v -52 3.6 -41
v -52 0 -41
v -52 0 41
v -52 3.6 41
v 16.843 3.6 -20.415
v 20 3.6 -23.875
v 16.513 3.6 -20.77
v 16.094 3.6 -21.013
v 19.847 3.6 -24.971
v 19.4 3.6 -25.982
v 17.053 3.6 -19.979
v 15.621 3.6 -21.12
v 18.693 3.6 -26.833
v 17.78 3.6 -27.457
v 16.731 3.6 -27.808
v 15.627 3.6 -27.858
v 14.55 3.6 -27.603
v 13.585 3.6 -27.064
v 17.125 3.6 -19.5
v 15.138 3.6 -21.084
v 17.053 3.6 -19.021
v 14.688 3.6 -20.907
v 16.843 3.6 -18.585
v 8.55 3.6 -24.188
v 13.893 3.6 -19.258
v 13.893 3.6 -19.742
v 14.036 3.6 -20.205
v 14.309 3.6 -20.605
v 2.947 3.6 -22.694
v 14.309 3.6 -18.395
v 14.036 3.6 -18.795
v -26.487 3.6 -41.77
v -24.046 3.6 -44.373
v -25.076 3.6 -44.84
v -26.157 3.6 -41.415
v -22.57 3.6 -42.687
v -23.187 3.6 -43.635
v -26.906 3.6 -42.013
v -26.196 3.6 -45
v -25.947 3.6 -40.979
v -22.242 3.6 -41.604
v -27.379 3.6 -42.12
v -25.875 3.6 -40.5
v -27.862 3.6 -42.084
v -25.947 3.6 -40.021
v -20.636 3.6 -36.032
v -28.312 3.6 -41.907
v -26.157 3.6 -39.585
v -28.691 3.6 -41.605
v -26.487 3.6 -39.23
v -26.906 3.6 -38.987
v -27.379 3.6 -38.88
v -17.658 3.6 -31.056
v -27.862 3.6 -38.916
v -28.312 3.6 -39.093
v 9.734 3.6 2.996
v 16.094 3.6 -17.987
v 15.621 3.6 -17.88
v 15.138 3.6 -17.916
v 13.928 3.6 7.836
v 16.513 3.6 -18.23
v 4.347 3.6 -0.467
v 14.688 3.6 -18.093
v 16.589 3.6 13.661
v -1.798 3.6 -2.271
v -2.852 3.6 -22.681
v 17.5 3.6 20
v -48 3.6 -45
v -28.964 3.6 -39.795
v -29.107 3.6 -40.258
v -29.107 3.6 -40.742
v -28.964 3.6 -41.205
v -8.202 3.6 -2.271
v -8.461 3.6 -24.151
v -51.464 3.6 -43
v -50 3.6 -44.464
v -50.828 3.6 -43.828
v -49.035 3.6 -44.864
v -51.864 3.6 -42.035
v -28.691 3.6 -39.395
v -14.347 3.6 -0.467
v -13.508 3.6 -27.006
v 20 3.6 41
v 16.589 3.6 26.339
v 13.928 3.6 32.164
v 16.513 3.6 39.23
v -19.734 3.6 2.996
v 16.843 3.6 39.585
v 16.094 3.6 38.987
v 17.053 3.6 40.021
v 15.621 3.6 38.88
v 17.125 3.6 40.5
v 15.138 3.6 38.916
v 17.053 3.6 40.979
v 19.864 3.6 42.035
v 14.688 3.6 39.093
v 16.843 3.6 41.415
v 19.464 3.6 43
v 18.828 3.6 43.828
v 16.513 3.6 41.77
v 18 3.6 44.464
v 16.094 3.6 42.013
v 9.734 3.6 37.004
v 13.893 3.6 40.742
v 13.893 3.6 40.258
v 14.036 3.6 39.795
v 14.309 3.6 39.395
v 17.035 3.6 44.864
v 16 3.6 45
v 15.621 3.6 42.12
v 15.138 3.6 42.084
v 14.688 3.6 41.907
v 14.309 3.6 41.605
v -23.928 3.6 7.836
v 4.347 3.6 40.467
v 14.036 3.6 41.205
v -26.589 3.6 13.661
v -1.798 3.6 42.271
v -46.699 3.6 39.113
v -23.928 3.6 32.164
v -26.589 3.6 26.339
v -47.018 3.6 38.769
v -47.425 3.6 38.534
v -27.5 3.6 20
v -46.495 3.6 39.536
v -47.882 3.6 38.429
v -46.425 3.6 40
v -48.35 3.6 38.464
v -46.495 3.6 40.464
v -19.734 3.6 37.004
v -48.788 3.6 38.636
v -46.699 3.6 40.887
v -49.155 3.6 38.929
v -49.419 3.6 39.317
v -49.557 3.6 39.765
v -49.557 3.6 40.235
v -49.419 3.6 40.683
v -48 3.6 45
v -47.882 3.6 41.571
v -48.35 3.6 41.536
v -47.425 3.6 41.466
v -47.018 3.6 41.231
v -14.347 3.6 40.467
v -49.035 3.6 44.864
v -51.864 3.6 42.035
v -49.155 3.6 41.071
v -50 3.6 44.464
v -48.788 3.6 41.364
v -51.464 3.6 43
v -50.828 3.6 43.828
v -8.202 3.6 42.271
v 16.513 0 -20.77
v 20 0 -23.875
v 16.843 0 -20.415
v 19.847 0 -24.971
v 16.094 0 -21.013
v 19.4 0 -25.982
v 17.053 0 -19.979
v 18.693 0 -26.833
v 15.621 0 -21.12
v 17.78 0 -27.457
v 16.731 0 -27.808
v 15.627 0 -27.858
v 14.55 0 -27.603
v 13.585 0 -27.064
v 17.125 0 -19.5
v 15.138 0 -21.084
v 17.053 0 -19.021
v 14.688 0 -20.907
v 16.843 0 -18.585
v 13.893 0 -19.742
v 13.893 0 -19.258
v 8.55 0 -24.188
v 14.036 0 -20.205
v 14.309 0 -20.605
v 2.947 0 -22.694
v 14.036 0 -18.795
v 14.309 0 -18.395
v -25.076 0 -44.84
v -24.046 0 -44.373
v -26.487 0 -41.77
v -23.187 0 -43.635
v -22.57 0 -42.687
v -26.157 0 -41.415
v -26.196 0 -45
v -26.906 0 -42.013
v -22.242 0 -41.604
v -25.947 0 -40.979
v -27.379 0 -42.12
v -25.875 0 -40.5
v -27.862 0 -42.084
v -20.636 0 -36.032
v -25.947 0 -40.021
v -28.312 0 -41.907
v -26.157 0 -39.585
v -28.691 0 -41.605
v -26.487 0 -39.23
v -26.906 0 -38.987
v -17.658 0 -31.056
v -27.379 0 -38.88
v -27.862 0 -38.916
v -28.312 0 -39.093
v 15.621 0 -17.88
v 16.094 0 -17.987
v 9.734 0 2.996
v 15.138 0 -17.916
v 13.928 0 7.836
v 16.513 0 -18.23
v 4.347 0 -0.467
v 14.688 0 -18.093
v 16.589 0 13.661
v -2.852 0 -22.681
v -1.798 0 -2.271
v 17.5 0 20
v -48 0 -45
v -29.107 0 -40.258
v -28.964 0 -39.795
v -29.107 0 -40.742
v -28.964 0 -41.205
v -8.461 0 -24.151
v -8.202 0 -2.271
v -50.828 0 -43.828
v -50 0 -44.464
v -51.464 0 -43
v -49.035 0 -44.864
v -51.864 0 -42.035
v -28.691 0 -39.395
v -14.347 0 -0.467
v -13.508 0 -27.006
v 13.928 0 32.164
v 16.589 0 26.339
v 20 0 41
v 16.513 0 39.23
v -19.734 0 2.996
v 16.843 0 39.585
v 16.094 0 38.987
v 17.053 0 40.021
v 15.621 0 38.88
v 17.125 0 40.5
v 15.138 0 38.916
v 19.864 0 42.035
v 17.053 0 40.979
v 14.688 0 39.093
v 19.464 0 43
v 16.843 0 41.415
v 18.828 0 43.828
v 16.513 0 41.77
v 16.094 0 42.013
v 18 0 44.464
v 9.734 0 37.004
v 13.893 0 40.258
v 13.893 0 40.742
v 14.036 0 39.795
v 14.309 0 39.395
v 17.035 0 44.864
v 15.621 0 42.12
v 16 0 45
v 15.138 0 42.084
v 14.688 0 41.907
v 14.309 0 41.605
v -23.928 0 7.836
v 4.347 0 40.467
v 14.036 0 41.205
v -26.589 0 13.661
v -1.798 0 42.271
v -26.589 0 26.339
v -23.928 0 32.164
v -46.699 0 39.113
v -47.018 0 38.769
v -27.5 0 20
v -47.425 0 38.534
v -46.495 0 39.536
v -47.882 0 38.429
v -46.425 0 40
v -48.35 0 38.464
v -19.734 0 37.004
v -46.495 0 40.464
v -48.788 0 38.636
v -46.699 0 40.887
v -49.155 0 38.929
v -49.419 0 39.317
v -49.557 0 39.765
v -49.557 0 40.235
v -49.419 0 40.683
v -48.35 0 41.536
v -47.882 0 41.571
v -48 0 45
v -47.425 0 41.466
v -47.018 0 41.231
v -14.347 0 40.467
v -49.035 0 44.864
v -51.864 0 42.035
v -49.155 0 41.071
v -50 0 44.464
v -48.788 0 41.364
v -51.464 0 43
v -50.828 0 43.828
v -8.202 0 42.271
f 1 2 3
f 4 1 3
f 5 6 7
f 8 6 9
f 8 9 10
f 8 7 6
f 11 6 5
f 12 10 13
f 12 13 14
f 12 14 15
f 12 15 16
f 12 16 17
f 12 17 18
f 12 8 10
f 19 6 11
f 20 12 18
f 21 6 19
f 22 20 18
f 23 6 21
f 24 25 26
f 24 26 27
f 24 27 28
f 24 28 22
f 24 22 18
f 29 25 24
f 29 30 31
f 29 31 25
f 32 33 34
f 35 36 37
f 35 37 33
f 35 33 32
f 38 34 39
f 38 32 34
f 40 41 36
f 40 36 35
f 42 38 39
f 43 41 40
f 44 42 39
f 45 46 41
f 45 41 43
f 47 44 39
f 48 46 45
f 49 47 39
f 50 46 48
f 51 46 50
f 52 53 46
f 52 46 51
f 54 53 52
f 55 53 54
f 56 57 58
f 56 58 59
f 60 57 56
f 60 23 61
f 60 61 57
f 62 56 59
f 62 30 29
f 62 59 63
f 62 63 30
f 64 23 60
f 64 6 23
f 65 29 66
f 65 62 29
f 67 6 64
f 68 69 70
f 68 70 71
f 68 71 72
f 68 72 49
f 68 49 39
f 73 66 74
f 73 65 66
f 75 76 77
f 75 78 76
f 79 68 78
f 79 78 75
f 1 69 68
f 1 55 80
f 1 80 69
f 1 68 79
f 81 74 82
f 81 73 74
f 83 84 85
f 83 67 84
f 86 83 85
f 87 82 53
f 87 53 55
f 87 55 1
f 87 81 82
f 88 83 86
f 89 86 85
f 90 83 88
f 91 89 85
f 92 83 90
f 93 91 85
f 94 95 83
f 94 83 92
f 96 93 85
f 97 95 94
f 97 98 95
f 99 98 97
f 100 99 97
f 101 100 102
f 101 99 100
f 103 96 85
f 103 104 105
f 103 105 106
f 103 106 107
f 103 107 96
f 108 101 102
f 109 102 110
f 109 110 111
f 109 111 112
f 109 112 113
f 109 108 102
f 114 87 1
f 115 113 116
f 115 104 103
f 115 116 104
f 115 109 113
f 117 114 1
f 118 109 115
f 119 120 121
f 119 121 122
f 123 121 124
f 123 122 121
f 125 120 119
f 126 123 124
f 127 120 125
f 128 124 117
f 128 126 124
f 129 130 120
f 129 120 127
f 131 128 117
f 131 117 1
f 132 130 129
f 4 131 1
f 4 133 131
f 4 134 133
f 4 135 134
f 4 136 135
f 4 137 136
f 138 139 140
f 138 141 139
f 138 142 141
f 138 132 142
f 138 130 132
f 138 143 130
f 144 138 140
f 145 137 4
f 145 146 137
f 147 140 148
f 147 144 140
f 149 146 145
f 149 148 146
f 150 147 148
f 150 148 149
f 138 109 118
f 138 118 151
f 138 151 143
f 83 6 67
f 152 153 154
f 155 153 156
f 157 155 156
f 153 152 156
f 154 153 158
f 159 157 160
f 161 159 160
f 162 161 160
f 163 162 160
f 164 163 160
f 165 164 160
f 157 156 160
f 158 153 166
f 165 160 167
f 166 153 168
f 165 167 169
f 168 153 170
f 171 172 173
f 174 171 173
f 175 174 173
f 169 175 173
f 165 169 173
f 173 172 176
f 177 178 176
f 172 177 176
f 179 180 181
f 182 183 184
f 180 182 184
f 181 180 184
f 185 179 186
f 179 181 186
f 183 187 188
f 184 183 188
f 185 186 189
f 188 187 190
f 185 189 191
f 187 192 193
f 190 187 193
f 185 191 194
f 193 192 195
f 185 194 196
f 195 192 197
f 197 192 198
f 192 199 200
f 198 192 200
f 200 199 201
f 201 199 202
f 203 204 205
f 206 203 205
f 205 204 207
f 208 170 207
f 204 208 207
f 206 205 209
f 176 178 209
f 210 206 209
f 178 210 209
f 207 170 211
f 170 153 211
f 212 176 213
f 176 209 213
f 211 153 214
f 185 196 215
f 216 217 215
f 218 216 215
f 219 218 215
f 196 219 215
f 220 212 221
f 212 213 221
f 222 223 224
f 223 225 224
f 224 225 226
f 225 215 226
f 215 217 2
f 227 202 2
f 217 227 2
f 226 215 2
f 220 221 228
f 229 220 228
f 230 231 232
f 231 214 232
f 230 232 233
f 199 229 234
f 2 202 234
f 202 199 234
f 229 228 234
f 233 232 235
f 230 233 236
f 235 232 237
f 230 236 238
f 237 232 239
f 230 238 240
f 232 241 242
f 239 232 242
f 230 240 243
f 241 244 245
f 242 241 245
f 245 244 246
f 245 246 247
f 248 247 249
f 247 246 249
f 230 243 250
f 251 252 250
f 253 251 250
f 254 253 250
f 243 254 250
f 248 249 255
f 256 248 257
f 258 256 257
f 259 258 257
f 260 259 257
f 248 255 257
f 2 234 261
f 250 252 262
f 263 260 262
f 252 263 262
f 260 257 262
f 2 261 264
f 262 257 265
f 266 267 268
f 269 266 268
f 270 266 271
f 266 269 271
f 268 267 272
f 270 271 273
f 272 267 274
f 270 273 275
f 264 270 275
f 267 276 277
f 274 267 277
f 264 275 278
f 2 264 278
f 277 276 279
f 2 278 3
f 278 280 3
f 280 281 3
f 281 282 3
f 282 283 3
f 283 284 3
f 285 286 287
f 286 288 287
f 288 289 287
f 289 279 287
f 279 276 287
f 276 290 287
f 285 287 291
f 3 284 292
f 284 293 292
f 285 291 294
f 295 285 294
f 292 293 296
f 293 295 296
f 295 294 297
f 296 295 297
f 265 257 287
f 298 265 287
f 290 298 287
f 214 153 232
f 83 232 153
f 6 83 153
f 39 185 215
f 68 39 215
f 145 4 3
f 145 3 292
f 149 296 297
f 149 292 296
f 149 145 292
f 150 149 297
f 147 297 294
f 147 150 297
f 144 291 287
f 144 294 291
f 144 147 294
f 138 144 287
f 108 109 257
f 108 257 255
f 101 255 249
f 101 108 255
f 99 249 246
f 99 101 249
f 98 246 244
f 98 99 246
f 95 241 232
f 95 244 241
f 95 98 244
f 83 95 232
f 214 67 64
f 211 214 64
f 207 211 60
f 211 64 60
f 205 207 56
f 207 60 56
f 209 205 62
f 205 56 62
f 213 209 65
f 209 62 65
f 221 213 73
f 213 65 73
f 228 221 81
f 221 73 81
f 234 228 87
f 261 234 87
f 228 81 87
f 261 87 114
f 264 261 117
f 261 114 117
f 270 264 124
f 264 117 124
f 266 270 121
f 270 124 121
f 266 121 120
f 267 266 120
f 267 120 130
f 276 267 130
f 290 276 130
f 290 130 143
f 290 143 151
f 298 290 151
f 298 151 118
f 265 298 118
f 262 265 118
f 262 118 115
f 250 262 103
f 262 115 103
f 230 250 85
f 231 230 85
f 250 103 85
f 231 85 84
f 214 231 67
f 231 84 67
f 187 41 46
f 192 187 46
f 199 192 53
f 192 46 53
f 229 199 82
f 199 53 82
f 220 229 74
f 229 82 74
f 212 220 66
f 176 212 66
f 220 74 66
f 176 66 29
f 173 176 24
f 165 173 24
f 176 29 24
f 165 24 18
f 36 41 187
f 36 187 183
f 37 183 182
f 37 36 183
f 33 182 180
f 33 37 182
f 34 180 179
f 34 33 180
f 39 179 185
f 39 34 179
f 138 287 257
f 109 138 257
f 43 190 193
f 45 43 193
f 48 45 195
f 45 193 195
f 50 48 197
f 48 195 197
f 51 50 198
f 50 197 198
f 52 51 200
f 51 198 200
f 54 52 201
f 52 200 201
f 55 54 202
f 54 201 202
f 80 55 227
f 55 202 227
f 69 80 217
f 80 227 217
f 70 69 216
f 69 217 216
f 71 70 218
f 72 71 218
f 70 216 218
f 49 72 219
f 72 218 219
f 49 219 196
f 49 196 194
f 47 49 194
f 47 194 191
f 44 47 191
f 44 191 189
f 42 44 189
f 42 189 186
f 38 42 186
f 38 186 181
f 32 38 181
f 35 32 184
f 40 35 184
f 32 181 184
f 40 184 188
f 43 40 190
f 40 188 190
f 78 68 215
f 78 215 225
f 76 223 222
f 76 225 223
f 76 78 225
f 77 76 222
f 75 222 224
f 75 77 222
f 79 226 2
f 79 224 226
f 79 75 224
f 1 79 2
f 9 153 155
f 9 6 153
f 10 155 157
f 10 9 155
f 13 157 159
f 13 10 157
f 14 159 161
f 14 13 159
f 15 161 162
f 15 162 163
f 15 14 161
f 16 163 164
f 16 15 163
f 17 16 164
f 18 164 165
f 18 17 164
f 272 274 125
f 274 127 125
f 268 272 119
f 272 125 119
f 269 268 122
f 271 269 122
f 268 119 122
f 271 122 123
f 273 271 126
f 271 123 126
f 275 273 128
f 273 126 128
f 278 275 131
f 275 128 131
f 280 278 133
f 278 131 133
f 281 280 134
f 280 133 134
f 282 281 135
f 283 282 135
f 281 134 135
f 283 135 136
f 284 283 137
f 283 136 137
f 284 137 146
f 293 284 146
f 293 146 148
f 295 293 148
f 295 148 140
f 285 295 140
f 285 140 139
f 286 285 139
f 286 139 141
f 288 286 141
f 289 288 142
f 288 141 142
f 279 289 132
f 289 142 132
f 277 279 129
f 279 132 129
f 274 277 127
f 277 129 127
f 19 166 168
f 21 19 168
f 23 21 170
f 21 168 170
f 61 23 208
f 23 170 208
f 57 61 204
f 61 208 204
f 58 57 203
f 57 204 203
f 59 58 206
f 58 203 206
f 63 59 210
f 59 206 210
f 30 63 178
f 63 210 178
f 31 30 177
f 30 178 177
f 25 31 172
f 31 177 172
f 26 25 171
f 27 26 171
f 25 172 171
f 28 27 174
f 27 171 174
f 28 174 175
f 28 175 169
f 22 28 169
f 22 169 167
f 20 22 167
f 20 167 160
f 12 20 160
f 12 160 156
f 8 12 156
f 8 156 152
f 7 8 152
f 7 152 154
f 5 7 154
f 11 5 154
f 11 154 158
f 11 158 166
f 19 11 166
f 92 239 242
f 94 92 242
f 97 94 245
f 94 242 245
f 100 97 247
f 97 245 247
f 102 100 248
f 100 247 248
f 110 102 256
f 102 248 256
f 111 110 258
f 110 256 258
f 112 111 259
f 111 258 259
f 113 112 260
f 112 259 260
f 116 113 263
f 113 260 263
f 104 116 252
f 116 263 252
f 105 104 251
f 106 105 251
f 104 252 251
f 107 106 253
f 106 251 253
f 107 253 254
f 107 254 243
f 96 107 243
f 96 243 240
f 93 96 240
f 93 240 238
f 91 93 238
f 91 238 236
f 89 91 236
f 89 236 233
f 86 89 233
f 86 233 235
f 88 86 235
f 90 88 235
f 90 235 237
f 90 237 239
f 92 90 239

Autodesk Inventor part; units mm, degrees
ref_plane "YZ Plane" through (0, 0, 0) normal (1, 0, 0) x (0, 1, 0)
ref_plane "XZ Plane" through (0, 0, 0) normal (0, 1, 0) x (-1, 0, 0)
ref_plane "XY Plane" through (0, 0, 0) normal (0, 0, 1) x (1, 0, 0)
sketch "Sketch1" plane through (0, 0, 0) normal (0, 1, 0) x (-1, 0, 0)
  line L0 (20, 45) -> (-20, 45)
  line L1 (-20, 45) -> (-20, -45)
  line L2 (-20, -45) -> (20, -45)
  line L3 (20, -45) -> (20, 45)
  line L4 (20, 45) -> (-20, -45) construction
  line L5 (-20, 45) -> (20, -45) construction
  arc A0 (-20, -45) -> (20, -45) centre (0, -45) ccw
  line L6 (20, -45) -> (52, -45)
  line L7 (52, -45) -> (52, 45)
  line L8 (52, 45) -> (20, 45)
  line L9 (20, 45) -> (20, -45)
  point P0 (0, 0)
  dimension "d0" = 40
  dimension "d1" = 90
  dimension "d7" = 32
  dimension "d8" = 90
extrude "Extrusion1" add sketch "Sketch1" along normal blind 3.6
sketch "Sketch3" plane through (0, 3.6, 0) normal (0, 1, 0) x (1, 0, 0)
  arc A0 (20, 45) -> (-20, 45) centre (0, 45) ccw projected
  circle A1 centre (0, 45) radius 20
  circle A2 centre (0, 45) radius 22.5
  point P0 (0, 0)
  point P1 (-19.7203, 38.3333)
  dimension "d13" = 45
extrude "Extrusion3" cut sketch "Sketch3" against normal blind 10 contours A1 A0 | A2
fillet "Fillet2" radius 4 5 edges at (-52, 1.8, -45) (-52, 1.8, 45) (20, 1.8, 45) (-22.5, 1.8, -45) (20, 1.8, -34.6922)
sketch "Sketch4" plane through (0, 3.6, 0) normal (0, 1, 0) x (1, 0, 0)
  circle A0 centre (-5, -20) radius 22.5
  line L0 (20, -41) -> (20, 23.8754) projected
  line L1 (-48, -45) -> (16, -45) projected
  point P0 (0, 0)
  dimension "d14" = 45
  dimension "d15" = 25
  dimension "d16" = 25
extrude "Extrusion4" cut sketch "Sketch4" against normal blind 10
sketch "Sketch5" plane through (0, 0, 0) normal (0, -1, 0) x (1, 0, 0)
  circle A0 centre (-27.5, -40.5) radius 1.625
  circle A1 centre (15.5, 40.5) radius 1.625
  circle A2 centre (15.5, -19.5) radius 1.625
  line L0 (20, 41) -> (20, -23.8754) projected
  line L1 (-48, 45) -> (16, 45) projected
  line L2 (-26.1964, -45) -> (-48, -45) projected
  line L3 (-52, -41) -> (-52, 41) projected
  point P0 (0, 0)
  dimension "d19" = 3.25
  dimension "d21" = 3.25
  dimension "d22" = 3.25
  dimension "d23" = 4.5
  dimension "d24" = 4.5
  dimension "d25" = 4.5
  dimension "d26" = 56.75
  dimension "d27" = 4.5
  dimension "d28" = 24.5
extrude "Extrusion5" cut sketch "Sketch5" against normal blind 10
sketch "Sketch6" plane through (0, 3.6, 0) normal (0, 1, 0) x (1, 0, 0)
  circle A0 centre (-48, -40) radius 1.575
  line L0 (-48, -45) -> (16, -45) projected
  line L1 (-52, 41) -> (-52, -41) projected
  point P0 (0, 0)
  dimension "d31" = 3.15
  dimension "d32" = 5
  dimension "d33" = 4
extrude "Extrusion6" cut sketch "Sketch6" against normal blind 10
properties part number "p1"
